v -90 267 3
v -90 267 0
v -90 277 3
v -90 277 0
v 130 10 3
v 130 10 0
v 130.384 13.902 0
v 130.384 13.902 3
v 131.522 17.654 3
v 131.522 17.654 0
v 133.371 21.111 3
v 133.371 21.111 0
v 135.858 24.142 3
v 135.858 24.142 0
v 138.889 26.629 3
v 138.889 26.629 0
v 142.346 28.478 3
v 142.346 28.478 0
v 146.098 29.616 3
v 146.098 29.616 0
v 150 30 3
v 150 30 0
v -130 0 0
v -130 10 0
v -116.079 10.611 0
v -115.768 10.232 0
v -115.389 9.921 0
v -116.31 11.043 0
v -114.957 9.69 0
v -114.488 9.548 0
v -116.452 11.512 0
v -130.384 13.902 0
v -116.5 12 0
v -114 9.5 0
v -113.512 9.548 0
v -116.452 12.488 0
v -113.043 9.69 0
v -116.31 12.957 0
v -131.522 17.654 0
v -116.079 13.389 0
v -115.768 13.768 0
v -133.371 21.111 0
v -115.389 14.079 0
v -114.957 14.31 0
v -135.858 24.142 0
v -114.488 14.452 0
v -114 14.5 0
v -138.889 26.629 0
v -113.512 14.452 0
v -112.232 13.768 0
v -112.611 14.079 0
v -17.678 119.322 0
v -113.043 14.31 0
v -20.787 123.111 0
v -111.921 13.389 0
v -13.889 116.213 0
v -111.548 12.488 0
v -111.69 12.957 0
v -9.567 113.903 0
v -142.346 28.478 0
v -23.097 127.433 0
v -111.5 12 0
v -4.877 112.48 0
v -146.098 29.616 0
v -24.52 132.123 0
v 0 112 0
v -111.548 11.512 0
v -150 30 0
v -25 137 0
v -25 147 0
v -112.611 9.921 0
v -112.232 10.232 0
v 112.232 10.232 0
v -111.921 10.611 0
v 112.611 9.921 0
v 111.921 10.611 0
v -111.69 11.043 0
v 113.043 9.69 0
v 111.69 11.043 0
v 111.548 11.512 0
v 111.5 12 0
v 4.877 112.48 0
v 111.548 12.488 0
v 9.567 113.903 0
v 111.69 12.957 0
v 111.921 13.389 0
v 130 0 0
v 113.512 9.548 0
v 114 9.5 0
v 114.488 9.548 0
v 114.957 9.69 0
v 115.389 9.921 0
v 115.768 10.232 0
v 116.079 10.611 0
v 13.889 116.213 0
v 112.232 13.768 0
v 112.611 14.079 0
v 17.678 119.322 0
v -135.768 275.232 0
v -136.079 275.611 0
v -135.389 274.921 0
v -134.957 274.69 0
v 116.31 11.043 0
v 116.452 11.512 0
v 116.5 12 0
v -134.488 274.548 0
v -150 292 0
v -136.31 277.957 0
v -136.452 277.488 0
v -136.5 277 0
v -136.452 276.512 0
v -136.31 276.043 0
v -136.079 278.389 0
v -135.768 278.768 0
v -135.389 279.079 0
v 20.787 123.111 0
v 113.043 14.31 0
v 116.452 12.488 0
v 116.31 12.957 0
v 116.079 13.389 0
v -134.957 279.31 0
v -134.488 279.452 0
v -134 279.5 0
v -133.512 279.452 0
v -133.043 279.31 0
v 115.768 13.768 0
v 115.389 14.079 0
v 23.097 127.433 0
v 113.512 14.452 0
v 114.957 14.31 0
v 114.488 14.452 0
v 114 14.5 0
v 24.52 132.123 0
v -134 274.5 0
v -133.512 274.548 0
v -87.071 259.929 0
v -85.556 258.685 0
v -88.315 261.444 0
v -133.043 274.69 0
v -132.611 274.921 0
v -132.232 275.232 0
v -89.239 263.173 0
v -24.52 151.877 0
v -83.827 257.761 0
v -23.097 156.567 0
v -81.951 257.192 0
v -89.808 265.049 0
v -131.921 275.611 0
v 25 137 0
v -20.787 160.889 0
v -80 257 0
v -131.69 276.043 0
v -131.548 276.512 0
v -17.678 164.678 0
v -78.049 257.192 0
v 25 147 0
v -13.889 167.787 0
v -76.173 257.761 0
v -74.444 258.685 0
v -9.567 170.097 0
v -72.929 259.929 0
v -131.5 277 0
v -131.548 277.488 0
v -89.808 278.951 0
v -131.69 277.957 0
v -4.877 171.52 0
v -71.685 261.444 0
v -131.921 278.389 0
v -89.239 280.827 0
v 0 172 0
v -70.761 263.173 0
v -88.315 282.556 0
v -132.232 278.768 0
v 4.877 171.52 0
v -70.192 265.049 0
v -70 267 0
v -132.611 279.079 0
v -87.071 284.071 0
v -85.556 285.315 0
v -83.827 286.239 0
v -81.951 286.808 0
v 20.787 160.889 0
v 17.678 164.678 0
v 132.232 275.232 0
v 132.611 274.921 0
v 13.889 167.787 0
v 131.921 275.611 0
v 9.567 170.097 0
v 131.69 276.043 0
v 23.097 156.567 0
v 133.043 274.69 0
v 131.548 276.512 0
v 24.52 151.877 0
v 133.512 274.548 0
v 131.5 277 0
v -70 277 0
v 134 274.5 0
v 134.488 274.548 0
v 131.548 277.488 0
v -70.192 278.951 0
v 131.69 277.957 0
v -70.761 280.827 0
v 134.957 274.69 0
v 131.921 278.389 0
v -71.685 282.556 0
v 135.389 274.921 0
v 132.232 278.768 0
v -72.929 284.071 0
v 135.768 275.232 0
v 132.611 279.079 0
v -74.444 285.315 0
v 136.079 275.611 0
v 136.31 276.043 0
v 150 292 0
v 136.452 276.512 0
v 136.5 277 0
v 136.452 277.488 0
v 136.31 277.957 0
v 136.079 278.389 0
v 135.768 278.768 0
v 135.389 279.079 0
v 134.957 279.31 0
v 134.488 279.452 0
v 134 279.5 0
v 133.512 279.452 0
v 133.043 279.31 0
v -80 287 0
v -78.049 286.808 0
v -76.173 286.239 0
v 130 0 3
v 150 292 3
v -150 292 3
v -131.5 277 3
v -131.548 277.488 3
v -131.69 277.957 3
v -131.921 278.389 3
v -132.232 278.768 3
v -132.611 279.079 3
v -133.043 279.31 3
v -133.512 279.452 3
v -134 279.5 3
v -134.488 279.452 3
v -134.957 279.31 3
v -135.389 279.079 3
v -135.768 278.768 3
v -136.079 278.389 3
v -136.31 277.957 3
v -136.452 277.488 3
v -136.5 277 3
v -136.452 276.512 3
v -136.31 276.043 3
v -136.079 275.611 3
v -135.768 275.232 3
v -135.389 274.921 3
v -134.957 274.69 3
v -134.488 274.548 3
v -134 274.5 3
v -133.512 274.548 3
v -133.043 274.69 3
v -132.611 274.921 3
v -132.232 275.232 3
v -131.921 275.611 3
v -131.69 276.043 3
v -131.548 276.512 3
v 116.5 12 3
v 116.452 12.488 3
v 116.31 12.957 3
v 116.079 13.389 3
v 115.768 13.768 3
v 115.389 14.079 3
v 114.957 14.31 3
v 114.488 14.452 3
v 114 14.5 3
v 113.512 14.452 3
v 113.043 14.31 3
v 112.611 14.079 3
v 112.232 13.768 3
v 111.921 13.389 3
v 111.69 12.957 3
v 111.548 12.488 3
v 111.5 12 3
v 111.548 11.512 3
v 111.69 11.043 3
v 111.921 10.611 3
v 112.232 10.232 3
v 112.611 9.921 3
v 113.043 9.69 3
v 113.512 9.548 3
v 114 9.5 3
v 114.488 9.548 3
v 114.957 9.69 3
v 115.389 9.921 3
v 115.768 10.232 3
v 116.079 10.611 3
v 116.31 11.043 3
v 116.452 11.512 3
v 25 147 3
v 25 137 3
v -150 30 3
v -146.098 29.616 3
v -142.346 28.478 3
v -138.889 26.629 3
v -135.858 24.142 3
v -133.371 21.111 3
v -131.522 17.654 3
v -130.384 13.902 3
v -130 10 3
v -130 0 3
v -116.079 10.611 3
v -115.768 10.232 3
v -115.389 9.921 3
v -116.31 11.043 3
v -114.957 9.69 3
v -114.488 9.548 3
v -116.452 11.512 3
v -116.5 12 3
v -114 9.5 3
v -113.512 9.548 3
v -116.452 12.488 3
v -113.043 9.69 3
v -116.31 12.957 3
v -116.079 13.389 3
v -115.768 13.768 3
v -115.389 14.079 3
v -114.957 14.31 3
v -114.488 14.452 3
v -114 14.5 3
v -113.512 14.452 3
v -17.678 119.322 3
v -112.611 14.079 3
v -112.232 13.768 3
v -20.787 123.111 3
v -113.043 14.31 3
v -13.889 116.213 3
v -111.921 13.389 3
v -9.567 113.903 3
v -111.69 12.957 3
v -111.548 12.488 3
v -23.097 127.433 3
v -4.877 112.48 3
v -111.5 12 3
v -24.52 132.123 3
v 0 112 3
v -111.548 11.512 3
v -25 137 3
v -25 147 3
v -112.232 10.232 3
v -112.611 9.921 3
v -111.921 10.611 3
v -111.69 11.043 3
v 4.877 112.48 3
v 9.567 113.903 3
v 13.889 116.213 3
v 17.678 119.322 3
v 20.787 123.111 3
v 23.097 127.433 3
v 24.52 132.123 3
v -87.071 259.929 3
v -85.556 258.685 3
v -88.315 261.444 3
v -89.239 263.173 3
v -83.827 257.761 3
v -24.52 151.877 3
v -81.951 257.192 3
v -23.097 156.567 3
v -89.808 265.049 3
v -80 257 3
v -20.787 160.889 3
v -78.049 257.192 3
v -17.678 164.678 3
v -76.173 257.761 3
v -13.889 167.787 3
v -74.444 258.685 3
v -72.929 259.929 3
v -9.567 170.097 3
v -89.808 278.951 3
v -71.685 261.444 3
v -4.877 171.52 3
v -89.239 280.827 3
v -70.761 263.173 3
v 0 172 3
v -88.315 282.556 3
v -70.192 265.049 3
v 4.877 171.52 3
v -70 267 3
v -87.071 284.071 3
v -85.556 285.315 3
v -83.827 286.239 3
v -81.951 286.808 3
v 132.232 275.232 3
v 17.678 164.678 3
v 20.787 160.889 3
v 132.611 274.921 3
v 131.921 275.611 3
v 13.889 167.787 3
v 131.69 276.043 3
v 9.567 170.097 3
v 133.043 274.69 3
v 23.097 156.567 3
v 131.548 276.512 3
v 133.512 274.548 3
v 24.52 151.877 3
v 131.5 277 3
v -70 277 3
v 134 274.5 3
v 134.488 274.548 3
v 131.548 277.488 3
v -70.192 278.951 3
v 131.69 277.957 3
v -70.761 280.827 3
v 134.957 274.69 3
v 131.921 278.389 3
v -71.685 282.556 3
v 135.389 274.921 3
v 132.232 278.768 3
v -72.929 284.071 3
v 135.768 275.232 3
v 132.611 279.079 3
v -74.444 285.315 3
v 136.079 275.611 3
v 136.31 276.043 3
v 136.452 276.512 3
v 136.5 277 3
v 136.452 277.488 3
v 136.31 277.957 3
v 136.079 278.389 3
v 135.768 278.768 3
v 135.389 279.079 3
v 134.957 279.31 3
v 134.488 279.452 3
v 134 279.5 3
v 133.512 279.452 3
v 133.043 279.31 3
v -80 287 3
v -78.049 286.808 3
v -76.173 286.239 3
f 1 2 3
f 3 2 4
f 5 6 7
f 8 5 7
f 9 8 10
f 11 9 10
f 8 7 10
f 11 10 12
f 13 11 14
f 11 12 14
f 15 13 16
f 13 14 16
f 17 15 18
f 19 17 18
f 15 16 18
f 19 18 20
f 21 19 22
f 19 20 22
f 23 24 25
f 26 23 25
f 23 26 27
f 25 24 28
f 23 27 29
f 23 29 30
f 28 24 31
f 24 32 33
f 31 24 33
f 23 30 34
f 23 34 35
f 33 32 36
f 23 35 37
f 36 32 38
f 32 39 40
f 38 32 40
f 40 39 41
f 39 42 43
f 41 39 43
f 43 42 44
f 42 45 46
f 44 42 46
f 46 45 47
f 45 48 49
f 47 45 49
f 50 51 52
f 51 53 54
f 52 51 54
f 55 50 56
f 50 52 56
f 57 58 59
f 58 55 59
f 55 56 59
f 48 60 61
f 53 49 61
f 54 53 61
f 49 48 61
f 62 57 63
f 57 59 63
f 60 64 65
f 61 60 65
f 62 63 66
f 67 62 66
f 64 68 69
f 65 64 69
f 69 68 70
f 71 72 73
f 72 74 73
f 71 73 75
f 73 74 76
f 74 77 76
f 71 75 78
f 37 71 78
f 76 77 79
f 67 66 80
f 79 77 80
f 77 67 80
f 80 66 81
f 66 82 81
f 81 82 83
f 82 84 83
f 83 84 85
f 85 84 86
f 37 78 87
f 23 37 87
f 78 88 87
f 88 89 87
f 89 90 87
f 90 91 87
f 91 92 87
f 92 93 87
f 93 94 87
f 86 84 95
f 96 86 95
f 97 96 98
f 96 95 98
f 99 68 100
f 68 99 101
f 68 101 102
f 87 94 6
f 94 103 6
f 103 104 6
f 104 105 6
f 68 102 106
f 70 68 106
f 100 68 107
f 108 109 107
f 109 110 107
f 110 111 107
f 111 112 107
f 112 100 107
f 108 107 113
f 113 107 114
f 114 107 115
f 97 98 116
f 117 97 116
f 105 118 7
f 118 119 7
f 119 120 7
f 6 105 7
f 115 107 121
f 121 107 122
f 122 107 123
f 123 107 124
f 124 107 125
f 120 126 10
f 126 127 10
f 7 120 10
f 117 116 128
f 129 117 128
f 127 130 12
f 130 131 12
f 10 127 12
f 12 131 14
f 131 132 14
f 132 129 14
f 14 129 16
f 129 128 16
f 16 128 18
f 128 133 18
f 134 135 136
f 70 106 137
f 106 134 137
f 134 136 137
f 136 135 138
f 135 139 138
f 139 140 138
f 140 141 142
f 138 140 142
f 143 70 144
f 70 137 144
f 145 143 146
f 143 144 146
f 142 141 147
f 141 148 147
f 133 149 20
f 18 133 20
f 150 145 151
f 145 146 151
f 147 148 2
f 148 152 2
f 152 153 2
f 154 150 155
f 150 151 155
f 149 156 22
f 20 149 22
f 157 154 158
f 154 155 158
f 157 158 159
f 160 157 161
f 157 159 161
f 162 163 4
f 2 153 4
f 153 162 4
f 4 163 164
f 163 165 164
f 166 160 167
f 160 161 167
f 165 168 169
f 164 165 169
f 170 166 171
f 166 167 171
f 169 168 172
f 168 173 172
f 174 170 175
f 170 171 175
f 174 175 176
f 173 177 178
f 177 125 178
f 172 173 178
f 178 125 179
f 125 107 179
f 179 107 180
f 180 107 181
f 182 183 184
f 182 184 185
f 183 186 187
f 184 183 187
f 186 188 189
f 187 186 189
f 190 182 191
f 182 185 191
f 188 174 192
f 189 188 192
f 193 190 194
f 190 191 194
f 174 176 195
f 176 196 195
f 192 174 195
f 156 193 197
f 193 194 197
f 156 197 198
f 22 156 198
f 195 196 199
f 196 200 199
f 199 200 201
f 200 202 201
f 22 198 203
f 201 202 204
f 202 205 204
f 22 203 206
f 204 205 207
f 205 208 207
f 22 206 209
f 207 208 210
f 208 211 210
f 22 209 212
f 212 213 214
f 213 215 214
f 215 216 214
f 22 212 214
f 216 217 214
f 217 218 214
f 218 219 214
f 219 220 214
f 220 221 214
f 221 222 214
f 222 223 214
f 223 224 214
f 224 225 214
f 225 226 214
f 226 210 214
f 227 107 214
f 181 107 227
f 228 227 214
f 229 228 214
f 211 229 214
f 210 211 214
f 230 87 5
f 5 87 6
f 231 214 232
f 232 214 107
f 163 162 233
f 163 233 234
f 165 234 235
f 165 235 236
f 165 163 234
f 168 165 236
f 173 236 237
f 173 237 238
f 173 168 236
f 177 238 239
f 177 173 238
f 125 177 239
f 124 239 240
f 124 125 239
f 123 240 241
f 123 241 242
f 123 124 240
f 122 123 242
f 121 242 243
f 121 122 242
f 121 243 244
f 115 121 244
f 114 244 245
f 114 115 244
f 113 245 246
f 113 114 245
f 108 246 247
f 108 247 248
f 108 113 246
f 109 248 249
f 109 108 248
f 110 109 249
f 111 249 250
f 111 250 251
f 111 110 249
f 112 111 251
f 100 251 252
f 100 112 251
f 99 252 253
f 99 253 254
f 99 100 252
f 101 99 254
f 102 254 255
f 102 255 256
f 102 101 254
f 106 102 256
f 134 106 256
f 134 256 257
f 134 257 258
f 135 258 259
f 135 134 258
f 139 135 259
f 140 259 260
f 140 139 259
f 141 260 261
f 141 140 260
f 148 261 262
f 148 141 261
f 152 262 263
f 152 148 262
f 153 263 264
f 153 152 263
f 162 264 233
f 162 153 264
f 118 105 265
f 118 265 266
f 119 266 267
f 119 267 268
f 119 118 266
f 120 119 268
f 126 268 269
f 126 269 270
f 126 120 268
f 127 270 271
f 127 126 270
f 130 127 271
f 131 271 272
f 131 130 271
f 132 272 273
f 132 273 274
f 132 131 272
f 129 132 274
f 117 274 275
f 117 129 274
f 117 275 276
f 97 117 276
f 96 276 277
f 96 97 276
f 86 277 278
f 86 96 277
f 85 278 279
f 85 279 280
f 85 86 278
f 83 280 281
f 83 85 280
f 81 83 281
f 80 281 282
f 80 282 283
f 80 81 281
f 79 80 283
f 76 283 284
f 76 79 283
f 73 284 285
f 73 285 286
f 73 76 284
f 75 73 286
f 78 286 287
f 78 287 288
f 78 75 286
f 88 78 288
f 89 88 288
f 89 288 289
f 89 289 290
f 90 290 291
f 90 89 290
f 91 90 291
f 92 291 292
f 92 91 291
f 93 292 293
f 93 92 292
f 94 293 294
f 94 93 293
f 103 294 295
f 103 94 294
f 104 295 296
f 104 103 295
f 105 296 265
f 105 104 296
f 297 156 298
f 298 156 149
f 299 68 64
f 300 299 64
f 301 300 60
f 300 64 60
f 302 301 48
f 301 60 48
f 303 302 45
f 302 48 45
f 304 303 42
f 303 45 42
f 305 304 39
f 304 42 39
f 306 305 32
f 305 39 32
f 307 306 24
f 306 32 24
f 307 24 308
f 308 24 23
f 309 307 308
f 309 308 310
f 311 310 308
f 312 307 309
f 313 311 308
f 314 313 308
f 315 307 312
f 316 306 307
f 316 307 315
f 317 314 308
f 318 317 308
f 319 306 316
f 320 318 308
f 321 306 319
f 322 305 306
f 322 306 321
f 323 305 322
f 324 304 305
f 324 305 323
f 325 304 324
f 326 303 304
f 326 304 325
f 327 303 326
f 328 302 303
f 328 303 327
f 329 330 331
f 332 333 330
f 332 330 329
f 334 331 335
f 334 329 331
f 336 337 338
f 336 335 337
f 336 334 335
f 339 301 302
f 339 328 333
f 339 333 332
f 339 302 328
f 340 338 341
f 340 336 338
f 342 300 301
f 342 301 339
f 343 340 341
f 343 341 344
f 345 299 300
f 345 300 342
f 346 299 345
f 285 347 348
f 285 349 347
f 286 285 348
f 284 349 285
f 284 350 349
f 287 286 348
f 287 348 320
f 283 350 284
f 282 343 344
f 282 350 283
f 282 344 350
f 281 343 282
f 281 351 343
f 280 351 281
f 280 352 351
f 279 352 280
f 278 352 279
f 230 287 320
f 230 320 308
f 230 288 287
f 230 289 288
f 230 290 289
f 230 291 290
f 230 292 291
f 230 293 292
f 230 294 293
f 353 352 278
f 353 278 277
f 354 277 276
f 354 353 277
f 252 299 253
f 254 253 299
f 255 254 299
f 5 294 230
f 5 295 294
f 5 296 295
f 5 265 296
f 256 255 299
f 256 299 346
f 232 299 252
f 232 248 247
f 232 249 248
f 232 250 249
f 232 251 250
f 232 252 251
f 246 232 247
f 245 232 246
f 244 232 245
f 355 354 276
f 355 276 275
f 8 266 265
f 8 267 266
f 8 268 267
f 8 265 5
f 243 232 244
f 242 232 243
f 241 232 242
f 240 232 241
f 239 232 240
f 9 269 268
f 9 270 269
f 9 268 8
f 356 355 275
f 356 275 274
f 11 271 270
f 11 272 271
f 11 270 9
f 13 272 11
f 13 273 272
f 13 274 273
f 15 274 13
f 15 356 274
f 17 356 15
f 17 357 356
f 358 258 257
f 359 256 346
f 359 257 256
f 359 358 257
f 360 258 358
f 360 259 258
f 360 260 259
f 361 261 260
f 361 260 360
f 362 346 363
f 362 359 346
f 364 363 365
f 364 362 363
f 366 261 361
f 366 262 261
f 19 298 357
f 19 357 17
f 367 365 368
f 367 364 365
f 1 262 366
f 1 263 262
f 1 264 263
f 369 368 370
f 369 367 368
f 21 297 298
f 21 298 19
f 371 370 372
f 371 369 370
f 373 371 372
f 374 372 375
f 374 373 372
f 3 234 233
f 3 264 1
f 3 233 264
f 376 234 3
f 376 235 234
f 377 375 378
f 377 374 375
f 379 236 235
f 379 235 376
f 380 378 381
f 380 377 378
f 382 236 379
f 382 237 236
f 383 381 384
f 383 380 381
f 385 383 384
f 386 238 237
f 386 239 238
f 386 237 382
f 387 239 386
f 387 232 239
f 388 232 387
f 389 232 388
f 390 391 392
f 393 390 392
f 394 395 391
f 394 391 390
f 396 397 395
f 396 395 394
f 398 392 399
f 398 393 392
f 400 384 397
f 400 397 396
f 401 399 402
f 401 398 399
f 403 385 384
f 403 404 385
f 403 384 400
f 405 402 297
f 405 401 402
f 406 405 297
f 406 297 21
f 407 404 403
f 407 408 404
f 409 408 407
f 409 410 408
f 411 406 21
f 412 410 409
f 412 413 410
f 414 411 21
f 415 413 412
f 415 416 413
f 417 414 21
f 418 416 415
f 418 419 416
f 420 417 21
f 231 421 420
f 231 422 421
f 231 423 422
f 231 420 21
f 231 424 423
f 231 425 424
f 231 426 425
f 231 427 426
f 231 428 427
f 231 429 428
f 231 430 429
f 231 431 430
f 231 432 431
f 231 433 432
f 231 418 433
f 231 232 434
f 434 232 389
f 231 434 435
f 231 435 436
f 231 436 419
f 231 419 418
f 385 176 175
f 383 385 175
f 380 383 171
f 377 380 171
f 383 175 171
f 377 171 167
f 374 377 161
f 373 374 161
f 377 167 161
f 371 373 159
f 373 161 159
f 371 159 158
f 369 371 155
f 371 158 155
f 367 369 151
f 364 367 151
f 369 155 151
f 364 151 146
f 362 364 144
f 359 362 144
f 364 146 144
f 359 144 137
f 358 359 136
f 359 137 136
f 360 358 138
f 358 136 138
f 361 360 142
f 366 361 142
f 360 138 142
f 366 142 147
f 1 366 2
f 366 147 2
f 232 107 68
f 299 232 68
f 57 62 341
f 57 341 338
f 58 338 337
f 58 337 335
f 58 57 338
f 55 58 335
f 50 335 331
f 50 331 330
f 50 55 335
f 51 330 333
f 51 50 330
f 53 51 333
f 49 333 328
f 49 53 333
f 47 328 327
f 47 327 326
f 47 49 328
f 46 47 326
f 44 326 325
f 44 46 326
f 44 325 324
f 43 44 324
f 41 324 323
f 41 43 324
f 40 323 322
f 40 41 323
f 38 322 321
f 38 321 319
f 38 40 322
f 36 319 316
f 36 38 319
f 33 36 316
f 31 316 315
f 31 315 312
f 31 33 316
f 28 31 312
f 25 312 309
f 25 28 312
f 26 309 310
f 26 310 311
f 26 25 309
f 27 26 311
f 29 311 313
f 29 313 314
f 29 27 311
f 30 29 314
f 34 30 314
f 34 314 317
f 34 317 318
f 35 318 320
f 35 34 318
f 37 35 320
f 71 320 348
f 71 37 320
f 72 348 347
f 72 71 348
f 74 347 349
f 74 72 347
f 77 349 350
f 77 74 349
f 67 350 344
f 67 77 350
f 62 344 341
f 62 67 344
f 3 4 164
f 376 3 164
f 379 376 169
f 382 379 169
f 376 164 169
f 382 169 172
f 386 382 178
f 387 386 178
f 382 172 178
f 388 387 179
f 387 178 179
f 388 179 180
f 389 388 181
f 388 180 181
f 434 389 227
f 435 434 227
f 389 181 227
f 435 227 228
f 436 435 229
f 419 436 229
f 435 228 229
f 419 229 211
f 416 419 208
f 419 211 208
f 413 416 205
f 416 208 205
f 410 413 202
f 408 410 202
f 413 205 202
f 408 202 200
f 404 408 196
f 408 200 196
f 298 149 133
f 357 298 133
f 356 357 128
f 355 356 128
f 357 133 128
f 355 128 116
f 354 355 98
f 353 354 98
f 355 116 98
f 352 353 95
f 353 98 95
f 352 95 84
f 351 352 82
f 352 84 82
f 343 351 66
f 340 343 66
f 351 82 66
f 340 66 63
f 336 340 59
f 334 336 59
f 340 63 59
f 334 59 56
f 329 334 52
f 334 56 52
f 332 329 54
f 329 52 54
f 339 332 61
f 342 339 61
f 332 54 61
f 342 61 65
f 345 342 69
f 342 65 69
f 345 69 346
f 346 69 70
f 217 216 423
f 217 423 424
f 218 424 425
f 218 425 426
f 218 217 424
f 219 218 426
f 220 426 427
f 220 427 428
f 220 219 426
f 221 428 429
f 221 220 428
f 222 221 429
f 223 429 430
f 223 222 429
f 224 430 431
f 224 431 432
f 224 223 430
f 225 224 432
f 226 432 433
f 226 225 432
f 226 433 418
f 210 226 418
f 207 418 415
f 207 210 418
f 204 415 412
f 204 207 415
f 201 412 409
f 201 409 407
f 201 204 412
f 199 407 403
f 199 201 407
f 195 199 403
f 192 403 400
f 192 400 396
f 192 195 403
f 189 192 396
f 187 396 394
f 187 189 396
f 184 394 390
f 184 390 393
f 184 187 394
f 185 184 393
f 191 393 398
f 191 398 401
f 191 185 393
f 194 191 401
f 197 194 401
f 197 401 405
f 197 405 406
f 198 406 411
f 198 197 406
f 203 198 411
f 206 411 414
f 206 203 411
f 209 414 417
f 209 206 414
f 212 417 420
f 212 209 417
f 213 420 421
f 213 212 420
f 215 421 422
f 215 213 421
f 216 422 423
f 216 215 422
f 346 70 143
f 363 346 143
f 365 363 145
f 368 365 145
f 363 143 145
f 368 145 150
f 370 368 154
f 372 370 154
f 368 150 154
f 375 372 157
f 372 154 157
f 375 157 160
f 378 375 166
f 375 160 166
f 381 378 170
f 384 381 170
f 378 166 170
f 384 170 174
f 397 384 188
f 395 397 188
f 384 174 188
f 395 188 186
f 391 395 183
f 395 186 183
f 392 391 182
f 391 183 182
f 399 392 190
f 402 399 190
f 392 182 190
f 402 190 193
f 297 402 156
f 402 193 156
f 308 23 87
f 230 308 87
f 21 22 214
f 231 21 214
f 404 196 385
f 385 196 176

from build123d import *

# Parameters (mm, degrees)
ESQUISSE1_R      = 2.5
EXTRUSION1_DEPTH = 3


with BuildPart() as part:
    # Esquisse1 → Extrusion1 (new body)
    with BuildSketch(Plane.XY):
        with BuildLine():
            Line((150, 292), (-150, 292))
            Line((-150, 292), (-150, 30))
            ThreePointArc((-150, 30), (-135.857864376, 24.142135624), (-130, 10))
            Line((-130, 10), (-130, 0))
            Line((-130, 0), (130, 0))
            Line((130, 0), (130, 10))
            ThreePointArc((130, 10), (135.857864376, 24.142135624), (150, 30))
            Line((150, 30), (150, 292))
        make_face()
        with Locations((134, 277)):
            Circle(ESQUISSE1_R, mode=Mode.SUBTRACT)
        with Locations((-134, 277)):
            Circle(ESQUISSE1_R, mode=Mode.SUBTRACT)
        with Locations((114, 12)):
            Circle(ESQUISSE1_R, mode=Mode.SUBTRACT)
        with Locations((-114, 12)):
            Circle(ESQUISSE1_R, mode=Mode.SUBTRACT)
        with BuildLine():
            Line((-25, 137), (-25, 147))
            ThreePointArc((-25, 147), (0, 172), (25, 147))
            Line((25, 147), (25, 137))
            ThreePointArc((25, 137), (0, 112), (-25, 137))
        make_face(mode=Mode.SUBTRACT)
        with BuildLine():
            Line((-90, 267), (-90, 277))
            ThreePointArc((-90, 277), (-80, 287), (-70, 277))
            Line((-70, 277), (-70, 267))
            ThreePointArc((-70, 267), (-80, 257), (-90, 267))
        make_face(mode=Mode.SUBTRACT)
    extrude(amount=EXTRUSION1_DEPTH)


solid = part.part
